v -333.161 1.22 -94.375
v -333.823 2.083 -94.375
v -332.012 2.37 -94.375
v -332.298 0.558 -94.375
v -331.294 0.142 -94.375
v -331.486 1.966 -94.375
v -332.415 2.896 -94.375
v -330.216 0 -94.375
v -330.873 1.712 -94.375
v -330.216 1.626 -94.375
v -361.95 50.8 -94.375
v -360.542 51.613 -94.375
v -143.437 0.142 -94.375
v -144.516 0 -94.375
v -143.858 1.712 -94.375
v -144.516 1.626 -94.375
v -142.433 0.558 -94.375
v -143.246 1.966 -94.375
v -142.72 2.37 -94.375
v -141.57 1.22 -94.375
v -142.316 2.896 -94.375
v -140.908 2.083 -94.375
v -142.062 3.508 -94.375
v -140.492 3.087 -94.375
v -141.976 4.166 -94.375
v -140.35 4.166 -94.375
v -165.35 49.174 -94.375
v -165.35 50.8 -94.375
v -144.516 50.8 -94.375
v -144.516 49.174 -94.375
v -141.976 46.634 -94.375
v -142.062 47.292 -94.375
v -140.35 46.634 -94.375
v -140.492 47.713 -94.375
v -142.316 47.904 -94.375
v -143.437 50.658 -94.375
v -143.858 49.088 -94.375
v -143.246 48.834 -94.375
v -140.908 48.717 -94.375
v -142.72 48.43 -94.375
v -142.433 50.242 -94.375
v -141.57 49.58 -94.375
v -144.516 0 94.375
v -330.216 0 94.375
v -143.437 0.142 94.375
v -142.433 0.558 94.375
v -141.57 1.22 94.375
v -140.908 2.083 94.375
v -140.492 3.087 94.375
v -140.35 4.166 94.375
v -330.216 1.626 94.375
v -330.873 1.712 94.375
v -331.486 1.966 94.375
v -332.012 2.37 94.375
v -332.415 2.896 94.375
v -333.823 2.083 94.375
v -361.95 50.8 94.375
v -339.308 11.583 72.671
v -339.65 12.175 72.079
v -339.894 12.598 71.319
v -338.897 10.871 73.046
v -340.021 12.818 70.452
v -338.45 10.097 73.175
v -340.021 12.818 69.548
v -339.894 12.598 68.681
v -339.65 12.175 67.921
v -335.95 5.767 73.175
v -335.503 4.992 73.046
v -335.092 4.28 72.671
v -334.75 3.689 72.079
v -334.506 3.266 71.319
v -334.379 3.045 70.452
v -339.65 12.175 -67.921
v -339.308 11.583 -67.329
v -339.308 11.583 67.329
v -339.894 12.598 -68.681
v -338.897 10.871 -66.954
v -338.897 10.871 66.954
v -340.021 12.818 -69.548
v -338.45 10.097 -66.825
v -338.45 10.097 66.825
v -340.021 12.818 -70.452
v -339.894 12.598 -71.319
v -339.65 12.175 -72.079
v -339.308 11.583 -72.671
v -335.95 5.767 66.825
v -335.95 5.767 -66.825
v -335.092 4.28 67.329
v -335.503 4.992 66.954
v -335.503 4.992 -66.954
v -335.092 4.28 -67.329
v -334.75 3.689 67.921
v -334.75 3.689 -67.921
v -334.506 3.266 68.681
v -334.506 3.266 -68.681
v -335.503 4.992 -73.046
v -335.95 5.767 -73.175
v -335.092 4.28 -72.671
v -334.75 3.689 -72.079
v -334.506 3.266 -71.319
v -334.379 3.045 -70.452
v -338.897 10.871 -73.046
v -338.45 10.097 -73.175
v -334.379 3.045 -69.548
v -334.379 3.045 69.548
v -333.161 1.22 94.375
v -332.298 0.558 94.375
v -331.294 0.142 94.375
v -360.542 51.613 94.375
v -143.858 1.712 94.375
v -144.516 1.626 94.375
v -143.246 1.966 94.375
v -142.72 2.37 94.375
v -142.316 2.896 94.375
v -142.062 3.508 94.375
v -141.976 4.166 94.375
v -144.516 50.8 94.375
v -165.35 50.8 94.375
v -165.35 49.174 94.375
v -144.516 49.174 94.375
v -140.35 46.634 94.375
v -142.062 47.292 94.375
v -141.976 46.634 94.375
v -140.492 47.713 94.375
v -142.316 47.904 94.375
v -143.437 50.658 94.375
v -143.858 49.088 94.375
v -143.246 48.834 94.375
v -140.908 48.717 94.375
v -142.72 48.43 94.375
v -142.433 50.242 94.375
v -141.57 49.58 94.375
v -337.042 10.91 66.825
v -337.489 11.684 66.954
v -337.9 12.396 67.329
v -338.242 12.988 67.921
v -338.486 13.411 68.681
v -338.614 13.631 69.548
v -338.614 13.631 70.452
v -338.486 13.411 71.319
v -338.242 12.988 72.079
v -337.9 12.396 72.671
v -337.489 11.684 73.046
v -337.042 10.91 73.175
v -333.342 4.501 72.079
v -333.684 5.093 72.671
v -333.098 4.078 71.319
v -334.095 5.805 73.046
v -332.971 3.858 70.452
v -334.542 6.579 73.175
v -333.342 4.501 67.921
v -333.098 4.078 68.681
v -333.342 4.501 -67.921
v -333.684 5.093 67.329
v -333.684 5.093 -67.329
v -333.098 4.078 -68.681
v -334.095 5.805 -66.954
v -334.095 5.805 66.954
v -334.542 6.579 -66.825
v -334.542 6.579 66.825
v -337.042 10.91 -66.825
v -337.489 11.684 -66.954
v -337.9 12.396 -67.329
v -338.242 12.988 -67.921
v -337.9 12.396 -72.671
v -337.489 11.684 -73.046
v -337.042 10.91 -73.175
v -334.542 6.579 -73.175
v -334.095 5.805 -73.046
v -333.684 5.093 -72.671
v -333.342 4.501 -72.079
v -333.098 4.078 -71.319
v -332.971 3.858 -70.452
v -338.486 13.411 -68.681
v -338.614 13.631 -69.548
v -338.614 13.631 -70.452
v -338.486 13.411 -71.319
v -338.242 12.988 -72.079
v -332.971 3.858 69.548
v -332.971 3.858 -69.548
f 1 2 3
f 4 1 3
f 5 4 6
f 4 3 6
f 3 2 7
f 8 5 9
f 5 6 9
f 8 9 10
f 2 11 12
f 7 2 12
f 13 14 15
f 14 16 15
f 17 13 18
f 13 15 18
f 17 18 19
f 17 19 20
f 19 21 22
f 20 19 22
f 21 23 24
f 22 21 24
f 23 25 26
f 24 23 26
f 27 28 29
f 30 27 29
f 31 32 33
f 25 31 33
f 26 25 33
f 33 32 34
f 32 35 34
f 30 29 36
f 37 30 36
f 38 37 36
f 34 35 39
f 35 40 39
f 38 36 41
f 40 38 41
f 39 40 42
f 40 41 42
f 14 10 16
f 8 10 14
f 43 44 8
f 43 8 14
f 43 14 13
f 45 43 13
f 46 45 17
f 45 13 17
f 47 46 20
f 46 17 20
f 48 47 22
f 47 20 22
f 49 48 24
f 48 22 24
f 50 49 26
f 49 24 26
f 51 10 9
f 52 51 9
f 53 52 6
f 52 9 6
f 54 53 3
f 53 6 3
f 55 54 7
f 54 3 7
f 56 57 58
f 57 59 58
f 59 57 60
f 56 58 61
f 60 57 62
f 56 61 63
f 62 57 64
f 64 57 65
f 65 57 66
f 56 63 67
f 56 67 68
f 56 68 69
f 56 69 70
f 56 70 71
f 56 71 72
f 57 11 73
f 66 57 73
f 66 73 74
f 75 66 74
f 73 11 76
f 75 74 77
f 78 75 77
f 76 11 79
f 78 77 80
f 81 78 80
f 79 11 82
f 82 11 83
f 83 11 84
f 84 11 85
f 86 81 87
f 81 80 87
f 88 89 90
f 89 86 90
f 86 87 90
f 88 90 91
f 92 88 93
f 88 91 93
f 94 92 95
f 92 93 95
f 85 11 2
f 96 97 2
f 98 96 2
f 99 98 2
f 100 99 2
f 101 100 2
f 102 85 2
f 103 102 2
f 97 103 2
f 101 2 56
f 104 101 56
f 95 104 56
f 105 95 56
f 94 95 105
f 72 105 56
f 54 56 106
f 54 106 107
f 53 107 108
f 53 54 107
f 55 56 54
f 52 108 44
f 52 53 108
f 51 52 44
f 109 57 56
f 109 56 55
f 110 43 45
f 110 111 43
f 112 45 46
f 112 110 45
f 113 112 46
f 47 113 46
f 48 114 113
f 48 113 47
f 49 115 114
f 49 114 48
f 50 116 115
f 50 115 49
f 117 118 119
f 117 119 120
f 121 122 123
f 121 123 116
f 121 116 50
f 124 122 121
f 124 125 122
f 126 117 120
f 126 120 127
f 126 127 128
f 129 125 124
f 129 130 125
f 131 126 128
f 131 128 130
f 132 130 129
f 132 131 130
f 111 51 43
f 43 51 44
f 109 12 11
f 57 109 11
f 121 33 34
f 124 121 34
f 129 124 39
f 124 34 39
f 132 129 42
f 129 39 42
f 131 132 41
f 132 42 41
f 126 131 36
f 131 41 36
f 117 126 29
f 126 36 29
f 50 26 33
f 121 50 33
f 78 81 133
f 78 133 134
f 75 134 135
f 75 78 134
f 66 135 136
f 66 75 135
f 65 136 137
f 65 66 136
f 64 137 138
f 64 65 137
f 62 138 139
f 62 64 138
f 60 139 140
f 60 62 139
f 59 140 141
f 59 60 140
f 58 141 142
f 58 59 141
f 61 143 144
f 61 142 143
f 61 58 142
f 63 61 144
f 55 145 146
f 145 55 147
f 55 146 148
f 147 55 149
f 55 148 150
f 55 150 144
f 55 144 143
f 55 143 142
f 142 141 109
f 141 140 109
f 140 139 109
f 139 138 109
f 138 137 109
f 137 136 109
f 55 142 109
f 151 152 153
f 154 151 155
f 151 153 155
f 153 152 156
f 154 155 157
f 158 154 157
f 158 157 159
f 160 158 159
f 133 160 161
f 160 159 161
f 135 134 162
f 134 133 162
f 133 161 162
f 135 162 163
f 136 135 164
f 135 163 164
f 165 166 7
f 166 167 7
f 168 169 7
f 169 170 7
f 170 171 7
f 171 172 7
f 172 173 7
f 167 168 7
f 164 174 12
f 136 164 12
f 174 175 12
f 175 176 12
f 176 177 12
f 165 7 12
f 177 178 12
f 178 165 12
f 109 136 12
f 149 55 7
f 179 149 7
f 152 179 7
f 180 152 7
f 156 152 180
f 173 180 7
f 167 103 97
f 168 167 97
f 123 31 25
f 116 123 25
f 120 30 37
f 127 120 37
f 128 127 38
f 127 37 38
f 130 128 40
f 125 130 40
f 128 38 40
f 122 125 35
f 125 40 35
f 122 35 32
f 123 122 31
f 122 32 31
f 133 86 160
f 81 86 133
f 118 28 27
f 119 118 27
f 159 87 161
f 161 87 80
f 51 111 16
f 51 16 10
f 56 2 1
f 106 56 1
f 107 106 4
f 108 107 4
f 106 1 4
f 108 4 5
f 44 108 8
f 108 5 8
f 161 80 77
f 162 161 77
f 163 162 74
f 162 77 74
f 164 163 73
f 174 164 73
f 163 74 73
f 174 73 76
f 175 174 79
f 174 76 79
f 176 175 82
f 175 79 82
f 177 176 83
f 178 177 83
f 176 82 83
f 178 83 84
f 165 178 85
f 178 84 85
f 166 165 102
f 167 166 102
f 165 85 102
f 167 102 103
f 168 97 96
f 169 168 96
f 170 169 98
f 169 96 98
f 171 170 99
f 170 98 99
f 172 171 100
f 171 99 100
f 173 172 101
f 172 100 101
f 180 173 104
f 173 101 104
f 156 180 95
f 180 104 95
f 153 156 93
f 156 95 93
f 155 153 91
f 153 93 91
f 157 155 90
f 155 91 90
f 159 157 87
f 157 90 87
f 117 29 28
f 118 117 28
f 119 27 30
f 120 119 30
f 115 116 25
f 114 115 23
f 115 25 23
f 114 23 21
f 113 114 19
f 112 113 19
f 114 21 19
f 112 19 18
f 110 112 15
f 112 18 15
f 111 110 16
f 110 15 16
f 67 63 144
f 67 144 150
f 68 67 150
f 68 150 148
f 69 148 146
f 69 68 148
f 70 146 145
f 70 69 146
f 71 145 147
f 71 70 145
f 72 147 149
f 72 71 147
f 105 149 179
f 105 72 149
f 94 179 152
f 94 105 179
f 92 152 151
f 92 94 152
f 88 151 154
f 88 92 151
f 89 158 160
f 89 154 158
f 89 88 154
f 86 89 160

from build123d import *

# Parameters (mm, degrees)
BASE_FLANGE1_START = -94.375
BASE_FLANGE1_DEPTH = 188.75
CUT_EXTRUDE1_REACH = 246.612


# Read off the part's stored shape, not the designer's step: Base-Flange1
with BuildPart() as part:
    # Base-Flange1 outline → Base-Flange1 (new body)
    with BuildSketch(Plane.XY.offset(BASE_FLANGE1_START)):
        with BuildLine():
            Line((-332.415300569, 2.8956), (-360.542189104, 51.6128))
            Line((-360.542189104, 51.6128), (-361.95, 50.8))
            Line((-361.95, 50.8), (-333.823111466, 2.0828))
            ThreePointArc((-333.823111466, 2.0828), (-332.298396044, 0.558084578), (-330.215596044, 0))
            Line((-330.215596044, 0), (-144.5156, 0))
            ThreePointArc((-144.5156, 0), (-141.570075992, 1.220075992), (-140.35, 4.1656))
            Line((-140.35, 4.1656), (-140.35, 46.6344))
            ThreePointArc((-140.35, 46.6344), (-141.570075992, 49.579924008), (-144.5156, 50.8))
            Line((-144.5156, 50.8), (-165.35, 50.8))
            Line((-165.35, 50.8), (-165.35, 49.1744))
            Line((-165.35, 49.1744), (-144.5156, 49.1744))
            ThreePointArc((-144.5156, 49.1744), (-142.719548776, 48.430451224), (-141.9756, 46.6344))
            Line((-141.9756, 46.6344), (-141.9756, 4.1656))
            ThreePointArc((-141.9756, 4.1656), (-142.719548776, 2.369548776), (-144.5156, 1.6256))
            Line((-144.5156, 1.6256), (-330.215596044, 1.6256))
            ThreePointArc((-330.215596044, 1.6256), (-331.485596044, 1.965895474), (-332.415300569, 2.8956))
        make_face()
    extrude(amount=BASE_FLANGE1_DEPTH)

    # Sketch15 → Cut-Extrude1 (cut, up to next)
    with BuildSketch(Plane(origin=(-249.465454744, -144.02894745, 0), x_dir=(0, 0, 1), z_dir=(-0.8660254037844362, -0.5000000000000044, 0)), mode=Mode.PRIVATE) as cut_extrude1_sk1:
        with BuildLine():
            Line((66.825, 172.969090512), (66.825, 177.969090512))
            ThreePointArc((66.825, 177.969090512), (70, 181.144090512), (73.175, 177.969090512))
            Line((73.175, 177.969090512), (73.175, 172.969090512))
            ThreePointArc((73.175, 172.969090512), (70, 169.794090512), (66.825, 172.969090512))
        make_face()
    cut_extrude1_tool1 = extrude(cut_extrude1_sk1.sketch, amount=-CUT_EXTRUDE1_REACH, mode=Mode.PRIVATE) & part.part
    # Sketch15 → Cut-Extrude1 (cut, up to next)
    with BuildSketch(Plane(origin=(-249.465454744, -144.02894745, 0), x_dir=(0, 0, 1), z_dir=(-0.8660254037844362, -0.5000000000000044, 0)), mode=Mode.PRIVATE) as cut_extrude1_sk2:
        with BuildLine():
            Line((-66.825, 172.969090512), (-66.825, 177.969090512))
            ThreePointArc((-66.825, 177.969090512), (-70, 181.144090512), (-73.175, 177.969090512))
            Line((-73.175, 177.969090512), (-73.175, 172.969090512))
            ThreePointArc((-73.175, 172.969090512), (-70, 169.794090512), (-66.825, 172.969090512))
        make_face()
    cut_extrude1_tool2 = extrude(cut_extrude1_sk2.sketch, amount=-CUT_EXTRUDE1_REACH, mode=Mode.PRIVATE) & part.part
    add(cut_extrude1_tool1.solids().sort_by_distance((-337.2, 7.931743, 70))[0], mode=Mode.SUBTRACT)
    add(cut_extrude1_tool2.solids().sort_by_distance((-337.2, 7.931743, -70))[0], mode=Mode.SUBTRACT)


solid = part.part
